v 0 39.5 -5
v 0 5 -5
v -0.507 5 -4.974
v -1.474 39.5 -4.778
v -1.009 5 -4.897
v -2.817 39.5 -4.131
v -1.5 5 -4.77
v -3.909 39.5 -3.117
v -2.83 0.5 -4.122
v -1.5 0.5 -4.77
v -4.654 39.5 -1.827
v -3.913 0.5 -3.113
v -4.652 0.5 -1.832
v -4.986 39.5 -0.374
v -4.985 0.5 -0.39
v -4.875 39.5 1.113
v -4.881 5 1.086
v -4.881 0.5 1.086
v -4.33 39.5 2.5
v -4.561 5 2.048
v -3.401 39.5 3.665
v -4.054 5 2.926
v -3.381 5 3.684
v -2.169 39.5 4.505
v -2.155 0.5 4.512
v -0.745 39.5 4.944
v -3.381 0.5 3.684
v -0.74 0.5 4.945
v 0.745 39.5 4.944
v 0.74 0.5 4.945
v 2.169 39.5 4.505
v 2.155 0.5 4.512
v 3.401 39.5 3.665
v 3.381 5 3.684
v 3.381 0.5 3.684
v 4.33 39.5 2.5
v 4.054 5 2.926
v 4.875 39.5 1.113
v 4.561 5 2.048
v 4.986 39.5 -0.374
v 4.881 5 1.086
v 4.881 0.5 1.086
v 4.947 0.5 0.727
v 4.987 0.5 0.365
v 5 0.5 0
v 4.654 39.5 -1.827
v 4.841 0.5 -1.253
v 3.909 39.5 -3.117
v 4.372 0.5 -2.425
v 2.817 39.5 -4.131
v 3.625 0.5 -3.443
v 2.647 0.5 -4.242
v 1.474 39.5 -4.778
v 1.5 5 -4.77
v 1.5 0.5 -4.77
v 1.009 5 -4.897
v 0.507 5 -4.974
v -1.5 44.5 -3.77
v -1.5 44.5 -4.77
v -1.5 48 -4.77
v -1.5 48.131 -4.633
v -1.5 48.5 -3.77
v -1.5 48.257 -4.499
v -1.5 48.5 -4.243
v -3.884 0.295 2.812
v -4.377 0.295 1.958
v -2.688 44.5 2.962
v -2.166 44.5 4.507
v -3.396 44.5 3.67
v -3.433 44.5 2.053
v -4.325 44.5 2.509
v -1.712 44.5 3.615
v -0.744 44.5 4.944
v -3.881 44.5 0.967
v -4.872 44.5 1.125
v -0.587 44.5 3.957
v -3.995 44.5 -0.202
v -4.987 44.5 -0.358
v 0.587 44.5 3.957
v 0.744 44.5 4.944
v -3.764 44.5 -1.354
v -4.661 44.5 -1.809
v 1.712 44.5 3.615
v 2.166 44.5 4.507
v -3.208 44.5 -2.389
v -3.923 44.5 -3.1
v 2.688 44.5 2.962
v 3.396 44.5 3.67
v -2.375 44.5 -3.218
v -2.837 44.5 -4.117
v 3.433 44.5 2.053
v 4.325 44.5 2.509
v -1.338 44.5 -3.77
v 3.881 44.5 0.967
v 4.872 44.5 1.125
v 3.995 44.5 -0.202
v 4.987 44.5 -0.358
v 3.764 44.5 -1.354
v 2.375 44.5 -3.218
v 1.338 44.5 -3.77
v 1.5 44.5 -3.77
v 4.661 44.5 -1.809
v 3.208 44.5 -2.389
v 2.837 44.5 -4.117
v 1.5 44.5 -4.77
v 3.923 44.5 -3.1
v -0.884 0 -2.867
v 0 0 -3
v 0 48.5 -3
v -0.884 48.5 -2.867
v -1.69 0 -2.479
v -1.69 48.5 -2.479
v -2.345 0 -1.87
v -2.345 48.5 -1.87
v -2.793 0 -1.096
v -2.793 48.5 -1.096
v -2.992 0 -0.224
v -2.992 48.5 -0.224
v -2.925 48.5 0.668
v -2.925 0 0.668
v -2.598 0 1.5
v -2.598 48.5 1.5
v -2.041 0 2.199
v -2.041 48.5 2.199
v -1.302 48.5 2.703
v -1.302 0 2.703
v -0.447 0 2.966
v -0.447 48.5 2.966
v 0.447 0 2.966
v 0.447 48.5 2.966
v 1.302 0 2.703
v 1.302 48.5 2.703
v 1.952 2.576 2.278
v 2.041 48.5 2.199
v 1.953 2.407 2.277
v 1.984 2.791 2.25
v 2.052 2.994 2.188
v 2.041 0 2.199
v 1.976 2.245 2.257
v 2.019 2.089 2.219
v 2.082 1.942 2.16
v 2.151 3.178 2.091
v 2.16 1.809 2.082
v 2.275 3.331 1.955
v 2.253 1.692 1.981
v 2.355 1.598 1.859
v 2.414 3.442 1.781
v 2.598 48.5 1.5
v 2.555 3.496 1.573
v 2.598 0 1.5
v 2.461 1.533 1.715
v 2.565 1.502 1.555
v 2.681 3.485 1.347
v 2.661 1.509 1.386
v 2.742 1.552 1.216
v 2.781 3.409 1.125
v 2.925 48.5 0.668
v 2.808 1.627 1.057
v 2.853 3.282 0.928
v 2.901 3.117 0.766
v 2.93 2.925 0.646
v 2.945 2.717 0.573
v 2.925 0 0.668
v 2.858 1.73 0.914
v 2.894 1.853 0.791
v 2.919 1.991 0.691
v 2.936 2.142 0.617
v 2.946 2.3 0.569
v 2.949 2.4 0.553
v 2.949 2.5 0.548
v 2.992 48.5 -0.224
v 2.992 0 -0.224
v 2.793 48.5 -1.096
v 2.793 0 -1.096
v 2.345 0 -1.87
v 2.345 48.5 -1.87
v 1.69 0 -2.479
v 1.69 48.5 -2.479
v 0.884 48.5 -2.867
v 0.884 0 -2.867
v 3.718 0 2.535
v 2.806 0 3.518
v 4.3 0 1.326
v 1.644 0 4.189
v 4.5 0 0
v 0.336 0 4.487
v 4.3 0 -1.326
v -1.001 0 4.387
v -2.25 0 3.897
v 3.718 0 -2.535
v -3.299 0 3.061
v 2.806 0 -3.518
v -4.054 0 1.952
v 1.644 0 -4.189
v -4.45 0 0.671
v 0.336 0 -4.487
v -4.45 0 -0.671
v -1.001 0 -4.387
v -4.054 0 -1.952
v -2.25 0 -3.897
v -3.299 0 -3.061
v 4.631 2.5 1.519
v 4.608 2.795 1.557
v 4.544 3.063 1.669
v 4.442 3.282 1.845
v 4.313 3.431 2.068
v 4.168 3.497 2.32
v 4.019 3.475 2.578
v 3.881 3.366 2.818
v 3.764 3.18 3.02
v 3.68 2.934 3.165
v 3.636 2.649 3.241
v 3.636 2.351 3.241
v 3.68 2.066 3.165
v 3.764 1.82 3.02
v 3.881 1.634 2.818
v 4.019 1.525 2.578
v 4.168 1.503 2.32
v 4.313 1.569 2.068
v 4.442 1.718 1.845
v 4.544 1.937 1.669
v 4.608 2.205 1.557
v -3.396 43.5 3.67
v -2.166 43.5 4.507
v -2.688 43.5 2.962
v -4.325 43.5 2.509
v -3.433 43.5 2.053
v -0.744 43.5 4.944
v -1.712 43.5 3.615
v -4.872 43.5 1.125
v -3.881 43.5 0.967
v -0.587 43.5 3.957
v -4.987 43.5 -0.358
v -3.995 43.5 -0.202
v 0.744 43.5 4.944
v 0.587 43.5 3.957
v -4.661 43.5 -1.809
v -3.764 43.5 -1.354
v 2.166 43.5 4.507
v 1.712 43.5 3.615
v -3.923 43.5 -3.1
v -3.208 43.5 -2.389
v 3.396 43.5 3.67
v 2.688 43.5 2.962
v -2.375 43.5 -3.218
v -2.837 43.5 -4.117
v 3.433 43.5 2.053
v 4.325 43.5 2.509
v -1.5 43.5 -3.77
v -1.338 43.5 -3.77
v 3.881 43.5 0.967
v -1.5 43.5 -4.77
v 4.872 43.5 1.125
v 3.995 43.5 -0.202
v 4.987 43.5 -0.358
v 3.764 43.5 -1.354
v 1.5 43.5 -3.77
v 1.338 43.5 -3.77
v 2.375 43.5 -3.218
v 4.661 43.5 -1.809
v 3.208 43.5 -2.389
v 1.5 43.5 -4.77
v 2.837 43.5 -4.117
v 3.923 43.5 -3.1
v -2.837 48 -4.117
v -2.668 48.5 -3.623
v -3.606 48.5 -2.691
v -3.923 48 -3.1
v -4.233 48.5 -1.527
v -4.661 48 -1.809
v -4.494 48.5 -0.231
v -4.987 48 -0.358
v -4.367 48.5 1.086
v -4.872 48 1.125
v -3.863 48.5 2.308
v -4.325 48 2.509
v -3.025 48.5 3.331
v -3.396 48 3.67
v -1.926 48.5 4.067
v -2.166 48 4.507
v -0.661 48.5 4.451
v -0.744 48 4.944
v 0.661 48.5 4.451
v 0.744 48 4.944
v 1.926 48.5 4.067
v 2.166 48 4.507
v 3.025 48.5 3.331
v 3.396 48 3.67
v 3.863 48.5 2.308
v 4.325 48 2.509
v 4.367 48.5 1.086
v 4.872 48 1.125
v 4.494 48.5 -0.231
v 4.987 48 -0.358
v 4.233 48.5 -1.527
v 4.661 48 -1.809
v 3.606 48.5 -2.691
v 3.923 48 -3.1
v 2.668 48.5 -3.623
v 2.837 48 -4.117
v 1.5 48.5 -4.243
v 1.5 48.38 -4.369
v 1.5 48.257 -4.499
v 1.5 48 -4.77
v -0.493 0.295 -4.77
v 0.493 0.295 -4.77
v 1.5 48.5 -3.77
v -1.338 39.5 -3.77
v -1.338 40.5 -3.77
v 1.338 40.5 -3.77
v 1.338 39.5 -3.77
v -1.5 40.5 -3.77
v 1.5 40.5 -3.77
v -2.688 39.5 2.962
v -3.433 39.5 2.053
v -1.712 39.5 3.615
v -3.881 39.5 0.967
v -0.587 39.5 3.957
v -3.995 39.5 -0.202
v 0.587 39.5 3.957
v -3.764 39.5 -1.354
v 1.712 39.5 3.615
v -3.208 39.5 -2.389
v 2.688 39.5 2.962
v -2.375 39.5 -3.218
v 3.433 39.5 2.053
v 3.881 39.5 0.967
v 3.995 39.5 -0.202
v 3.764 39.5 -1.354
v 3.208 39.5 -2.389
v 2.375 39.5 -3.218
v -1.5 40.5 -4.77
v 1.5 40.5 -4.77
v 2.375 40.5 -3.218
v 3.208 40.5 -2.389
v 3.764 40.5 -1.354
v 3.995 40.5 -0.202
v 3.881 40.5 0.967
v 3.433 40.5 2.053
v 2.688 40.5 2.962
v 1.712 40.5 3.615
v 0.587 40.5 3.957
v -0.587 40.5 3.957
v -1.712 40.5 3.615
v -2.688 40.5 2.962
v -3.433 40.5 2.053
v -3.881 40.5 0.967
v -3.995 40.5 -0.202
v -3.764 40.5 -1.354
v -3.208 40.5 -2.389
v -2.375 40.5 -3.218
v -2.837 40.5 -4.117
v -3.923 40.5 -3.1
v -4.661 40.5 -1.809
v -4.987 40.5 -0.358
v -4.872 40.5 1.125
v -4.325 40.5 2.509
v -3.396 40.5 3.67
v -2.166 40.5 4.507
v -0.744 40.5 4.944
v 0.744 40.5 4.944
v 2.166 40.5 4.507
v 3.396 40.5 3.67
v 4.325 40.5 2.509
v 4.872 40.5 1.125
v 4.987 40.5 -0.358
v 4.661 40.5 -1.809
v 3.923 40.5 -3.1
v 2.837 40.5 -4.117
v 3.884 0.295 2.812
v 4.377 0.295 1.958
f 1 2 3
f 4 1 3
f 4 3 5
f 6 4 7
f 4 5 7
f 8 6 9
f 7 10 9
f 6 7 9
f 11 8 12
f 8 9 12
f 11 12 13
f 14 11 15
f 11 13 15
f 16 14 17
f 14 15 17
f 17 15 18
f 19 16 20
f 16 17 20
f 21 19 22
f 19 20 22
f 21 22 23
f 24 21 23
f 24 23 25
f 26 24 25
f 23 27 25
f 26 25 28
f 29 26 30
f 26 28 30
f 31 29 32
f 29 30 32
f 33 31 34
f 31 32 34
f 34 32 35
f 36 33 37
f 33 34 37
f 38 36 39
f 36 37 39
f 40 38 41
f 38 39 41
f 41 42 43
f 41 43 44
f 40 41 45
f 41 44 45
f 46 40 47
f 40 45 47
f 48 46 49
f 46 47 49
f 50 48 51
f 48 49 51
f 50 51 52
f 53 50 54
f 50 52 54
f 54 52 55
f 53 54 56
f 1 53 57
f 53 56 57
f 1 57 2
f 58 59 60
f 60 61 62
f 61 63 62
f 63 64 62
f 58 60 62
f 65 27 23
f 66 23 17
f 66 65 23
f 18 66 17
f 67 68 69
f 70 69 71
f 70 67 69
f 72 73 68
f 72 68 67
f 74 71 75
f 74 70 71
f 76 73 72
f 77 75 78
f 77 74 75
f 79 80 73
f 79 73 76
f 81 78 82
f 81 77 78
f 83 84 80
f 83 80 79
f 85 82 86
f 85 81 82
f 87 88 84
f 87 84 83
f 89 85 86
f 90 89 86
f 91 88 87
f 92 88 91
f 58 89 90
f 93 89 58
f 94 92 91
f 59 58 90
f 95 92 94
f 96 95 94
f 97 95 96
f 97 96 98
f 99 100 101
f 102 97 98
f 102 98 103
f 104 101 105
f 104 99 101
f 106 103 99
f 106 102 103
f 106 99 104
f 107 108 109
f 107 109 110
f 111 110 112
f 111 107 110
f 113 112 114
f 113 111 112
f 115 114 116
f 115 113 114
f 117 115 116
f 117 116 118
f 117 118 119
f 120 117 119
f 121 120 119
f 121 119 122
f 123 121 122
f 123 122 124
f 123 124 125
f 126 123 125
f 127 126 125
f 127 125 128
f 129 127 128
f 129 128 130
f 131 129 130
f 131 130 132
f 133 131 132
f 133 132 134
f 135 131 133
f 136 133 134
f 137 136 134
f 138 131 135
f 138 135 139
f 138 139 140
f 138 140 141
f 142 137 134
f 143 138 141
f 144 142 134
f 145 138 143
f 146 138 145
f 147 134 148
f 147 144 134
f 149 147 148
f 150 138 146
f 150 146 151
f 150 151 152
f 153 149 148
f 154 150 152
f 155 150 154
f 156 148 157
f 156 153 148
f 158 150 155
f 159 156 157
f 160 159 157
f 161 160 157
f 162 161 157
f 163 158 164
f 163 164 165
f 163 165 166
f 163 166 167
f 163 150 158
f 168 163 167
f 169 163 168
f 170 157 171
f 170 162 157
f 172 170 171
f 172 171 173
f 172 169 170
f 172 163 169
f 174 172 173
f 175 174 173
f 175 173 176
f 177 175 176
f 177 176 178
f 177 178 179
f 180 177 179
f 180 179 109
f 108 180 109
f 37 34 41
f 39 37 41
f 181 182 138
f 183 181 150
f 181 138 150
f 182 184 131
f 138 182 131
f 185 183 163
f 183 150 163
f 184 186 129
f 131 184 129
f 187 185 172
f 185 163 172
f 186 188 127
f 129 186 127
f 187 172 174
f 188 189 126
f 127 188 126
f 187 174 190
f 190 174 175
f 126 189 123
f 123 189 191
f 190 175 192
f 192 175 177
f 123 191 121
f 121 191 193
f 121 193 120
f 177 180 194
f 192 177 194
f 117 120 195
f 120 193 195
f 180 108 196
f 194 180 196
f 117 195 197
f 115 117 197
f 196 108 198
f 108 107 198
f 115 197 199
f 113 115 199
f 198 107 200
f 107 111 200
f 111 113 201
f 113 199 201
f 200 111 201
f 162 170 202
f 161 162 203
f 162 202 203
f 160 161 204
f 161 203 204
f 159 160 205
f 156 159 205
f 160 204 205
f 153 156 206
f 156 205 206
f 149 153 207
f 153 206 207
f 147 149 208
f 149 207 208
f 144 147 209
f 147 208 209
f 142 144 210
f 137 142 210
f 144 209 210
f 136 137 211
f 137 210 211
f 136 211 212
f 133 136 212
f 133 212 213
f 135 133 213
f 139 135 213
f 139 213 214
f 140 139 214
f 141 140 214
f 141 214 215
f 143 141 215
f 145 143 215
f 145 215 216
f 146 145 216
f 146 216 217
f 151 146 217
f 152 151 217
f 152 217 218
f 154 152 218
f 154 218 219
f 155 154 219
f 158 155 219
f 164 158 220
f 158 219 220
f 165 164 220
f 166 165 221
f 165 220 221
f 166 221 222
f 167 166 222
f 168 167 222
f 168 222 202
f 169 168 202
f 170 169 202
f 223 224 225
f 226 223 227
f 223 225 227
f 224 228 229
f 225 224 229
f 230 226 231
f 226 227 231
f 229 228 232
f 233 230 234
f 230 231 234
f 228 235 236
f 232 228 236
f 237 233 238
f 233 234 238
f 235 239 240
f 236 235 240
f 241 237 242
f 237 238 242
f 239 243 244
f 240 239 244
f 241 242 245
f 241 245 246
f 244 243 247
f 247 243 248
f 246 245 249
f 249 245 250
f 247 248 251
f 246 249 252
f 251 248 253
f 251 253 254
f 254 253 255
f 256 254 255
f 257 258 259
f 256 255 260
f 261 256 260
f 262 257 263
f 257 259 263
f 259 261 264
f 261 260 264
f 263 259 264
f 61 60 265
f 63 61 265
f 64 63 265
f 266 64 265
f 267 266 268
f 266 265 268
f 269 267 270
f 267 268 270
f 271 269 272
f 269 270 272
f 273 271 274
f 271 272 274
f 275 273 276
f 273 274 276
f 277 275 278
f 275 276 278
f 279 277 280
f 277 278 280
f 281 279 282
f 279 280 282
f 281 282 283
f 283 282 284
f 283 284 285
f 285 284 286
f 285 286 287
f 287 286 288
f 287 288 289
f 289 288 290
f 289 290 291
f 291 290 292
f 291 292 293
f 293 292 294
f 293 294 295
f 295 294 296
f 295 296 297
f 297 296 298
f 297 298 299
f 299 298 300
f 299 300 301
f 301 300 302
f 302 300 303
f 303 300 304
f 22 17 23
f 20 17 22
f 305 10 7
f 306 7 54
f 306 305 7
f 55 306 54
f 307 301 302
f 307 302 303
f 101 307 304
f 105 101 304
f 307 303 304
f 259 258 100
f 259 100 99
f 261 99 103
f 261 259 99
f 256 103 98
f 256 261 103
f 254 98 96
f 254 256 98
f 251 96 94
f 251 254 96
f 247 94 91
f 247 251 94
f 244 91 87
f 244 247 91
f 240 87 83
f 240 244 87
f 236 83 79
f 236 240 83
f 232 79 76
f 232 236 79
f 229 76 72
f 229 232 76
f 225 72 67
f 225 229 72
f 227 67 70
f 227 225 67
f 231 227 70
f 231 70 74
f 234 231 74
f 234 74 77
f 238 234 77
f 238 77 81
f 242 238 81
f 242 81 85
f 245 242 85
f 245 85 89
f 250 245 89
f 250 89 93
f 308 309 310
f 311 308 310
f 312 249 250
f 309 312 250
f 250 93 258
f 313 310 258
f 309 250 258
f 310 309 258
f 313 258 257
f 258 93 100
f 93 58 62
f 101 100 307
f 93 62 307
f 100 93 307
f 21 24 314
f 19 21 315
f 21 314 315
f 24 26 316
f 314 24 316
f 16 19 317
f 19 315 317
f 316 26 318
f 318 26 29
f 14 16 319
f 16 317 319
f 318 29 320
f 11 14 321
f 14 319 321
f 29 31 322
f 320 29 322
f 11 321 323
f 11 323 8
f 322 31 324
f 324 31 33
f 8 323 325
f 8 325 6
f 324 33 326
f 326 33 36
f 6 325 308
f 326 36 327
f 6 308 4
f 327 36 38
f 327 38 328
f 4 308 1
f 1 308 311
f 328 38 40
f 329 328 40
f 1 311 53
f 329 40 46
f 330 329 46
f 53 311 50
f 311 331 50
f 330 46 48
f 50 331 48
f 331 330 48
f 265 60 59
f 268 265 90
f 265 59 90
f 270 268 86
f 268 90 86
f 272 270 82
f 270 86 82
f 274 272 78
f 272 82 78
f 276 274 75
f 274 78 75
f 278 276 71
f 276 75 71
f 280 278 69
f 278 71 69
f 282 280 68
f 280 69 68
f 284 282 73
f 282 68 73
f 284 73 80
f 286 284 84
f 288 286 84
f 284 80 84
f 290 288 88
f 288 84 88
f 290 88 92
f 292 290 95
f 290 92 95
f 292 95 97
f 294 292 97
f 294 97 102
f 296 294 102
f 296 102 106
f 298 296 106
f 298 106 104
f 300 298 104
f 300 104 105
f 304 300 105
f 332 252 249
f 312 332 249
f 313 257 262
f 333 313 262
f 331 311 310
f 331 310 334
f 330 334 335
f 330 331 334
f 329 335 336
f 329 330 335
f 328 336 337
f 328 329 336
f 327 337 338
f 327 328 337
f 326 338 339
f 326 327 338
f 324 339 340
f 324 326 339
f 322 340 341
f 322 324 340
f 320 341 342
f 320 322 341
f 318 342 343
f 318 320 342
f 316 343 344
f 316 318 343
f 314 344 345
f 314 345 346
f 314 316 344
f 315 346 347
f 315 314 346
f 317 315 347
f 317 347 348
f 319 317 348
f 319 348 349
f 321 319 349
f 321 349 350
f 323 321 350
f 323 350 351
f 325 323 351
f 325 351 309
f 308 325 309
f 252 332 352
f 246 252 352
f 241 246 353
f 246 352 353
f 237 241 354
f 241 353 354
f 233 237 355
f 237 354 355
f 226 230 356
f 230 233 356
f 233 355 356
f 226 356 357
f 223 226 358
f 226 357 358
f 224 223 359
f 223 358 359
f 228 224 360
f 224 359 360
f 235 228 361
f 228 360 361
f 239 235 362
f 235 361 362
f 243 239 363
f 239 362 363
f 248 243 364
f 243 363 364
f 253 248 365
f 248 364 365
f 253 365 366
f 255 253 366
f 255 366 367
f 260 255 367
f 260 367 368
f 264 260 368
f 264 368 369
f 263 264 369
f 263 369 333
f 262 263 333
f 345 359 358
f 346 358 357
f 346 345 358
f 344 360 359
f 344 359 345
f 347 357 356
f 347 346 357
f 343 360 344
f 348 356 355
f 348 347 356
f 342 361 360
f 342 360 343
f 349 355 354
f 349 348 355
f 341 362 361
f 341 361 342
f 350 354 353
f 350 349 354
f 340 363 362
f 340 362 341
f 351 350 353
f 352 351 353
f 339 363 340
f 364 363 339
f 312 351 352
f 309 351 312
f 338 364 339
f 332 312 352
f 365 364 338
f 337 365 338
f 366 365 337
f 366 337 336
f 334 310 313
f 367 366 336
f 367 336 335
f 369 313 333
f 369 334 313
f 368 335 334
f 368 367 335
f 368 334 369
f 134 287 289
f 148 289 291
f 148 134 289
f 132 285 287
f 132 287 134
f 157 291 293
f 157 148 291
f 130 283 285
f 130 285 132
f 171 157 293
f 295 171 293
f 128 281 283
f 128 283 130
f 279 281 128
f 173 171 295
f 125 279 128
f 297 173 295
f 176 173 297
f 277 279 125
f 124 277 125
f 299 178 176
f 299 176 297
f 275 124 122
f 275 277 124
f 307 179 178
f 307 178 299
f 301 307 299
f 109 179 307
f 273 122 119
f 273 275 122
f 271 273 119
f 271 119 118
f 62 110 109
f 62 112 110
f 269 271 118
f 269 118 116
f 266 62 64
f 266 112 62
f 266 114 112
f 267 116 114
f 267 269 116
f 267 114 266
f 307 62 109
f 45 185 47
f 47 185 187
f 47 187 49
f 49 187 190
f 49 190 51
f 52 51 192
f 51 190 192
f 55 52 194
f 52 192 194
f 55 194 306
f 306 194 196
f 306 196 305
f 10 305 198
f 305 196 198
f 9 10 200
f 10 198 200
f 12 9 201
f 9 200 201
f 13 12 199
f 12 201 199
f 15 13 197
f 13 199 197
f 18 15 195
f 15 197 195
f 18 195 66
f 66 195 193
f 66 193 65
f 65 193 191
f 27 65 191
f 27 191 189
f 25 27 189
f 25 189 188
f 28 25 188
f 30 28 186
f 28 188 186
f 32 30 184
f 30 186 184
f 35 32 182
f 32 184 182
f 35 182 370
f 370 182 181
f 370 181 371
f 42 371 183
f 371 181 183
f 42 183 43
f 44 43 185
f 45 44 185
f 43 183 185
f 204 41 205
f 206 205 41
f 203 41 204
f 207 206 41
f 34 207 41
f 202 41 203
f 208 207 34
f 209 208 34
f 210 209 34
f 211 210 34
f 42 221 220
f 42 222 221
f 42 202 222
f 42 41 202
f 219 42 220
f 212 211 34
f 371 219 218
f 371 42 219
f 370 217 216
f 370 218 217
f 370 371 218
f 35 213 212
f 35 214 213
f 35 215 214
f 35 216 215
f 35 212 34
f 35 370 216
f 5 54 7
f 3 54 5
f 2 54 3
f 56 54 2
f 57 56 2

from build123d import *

# Parameters (mm, degrees)
ESQUISSE1_R                  = 5
ESQUISSE1_R_2                = 3
BOSS_EXTRU_1_DEPTH           = 48.5
ENL_V_MAT_EXTRU_1_DEPTH      = 5
ENL_V_MAT_EXTRU_2_REACH      = 51.901
ENL_V_MAT_EXTRU_2_END_RADIUS = 3
ESQUISSE3_R                  = 1
ESQUISSE4_R                  = 5
ESQUISSE4_R_2                = 4
ENL_V_MAT_EXTRU_3_DEPTH      = 1
ESQUISSE6_R                  = 5
ESQUISSE6_R_2                = 4
ENL_V_MAT_EXTRU_5_DEPTH      = 1
ENL_V_MAT_EXTRU_4_REACH      = 51.013


with BuildPart() as part:
    # Esquisse1 → Boss.-Extru.1 (new body)
    with BuildSketch(Plane(origin=(0, 0, 0), x_dir=(1, 0, 0), z_dir=(0, 1, 0))):
        with Locations(Location((0, 0, 0), (0, 0, 90))):
            Circle(ESQUISSE1_R)
        with Locations(Location((0, 0, 0), (0, 0, 90))):
            Circle(ESQUISSE1_R_2, mode=Mode.SUBTRACT)
    extrude(amount=BOSS_EXTRU_1_DEPTH)

    # Esquisse2 → Enlèv. mat.-Extru.1 (cut)
    with BuildSketch(Plane.XZ):
        with BuildLine():
            Line((-1.5, -4.769696007), (1.5, -4.769696007))
            ThreePointArc((1.5, -4.769696007), (0, -5), (-1.5, -4.769696007))
        make_face()
        with BuildLine():
            Line((-3.38067791, 3.683886109), (-4.88067791, 1.085809898))
            ThreePointArc((-4.88067791, 1.085809898), (-4.330127019, 2.5), (-3.38067791, 3.683886109))
        make_face()
        with BuildLine():
            Line((4.88067791, 1.085809898), (3.38067791, 3.683886109))
            ThreePointArc((3.38067791, 3.683886109), (4.330127019, 2.5), (4.88067791, 1.085809898))
        make_face()
    extrude(amount=-ENL_V_MAT_EXTRU_1_DEPTH, mode=Mode.SUBTRACT)

    # Enlèv. mat.-Extru.2: up to this cylinder (the profile starts outside it)
    enl_v_mat_extru_2_end = Plane(origin=(0, 2.5, 0), z_dir=(0, -1, 0)) * Cylinder(ENL_V_MAT_EXTRU_2_END_RADIUS, 110.802, mode=Mode.PRIVATE)
    # Esquisse3 → Enlèv. mat.-Extru.2 (cut, up to the surface)
    with BuildSketch(Plane(origin=(4.13067791, 0, 2.384848004), x_dir=(0.49999999999999223, 0, -0.8660254037844431), z_dir=(0.8660254037844431, 0, 0.49999999999999223)), mode=Mode.PRIVATE) as enl_v_mat_extru_2_sk1:
        with Locations((0, 2.5)):
            Circle(ESQUISSE3_R)
    enl_v_mat_extru_2_tool1 = extrude(enl_v_mat_extru_2_sk1.sketch, amount=-ENL_V_MAT_EXTRU_2_REACH, mode=Mode.PRIVATE) - enl_v_mat_extru_2_end
    add(enl_v_mat_extru_2_tool1.solids().sort_by_distance((4.130678, 2.5, 2.384848))[0], mode=Mode.SUBTRACT)

    # Esquisse4 → Enlèv. mat.-Extru.3 (cut)
    with BuildSketch(Plane(origin=(0, 39.5, 0), x_dir=(-1, 0, 0), z_dir=(0, -1, 0))):
        with Locations(Location((0, 0, 0), (0, 0, 90))):
            Circle(ESQUISSE4_R)
        with Locations(Location((0, 0, 0), (0, 0, 90))):
            Circle(ESQUISSE4_R_2, mode=Mode.SUBTRACT)
    extrude(amount=-ENL_V_MAT_EXTRU_3_DEPTH, mode=Mode.SUBTRACT)

    # Esquisse6 → Enlèv. mat.-Extru.5 (cut)
    with BuildSketch(Plane(origin=(0, 43.5, 0), x_dir=(-1, 0, 0), z_dir=(0, -1, 0))):
        with Locations(Location((0, 0, 0), (0, 0, 90))):
            Circle(ESQUISSE6_R)
        with Locations(Location((0, 0, 0), (0, 0, 90))):
            Circle(ESQUISSE6_R_2, mode=Mode.SUBTRACT)
    extrude(amount=-ENL_V_MAT_EXTRU_5_DEPTH, mode=Mode.SUBTRACT)

    # Enlèv. mat.-Extru.4: up to this face of the body (flat: up to its plane)
    enl_v_mat_extru_4_end = Plane(part.part.faces().sort_by_distance((0, 39.5, 4.858578644))[0])
    # Esquisse5 → Enlèv. mat.-Extru.4 (cut, up to the picked face)
    with BuildSketch(Plane(origin=(0, 48.5, 0), x_dir=(1, 0, 0), z_dir=(0, 1, 0)), mode=Mode.PRIVATE) as enl_v_mat_extru_4_sk1:
        with BuildLine():
            Line((-1.5, 3.769696007), (1.5, 3.769696007))
            Line((1.5, 3.769696007), (1.5, 4.769696007))
            ThreePointArc((1.5, 4.769696007), (0, 5), (-1.5, 4.769696007))
            Line((-1.5, 4.769696007), (-1.5, 3.769696007))
        make_face()
    enl_v_mat_extru_4_tool1 = split(extrude(enl_v_mat_extru_4_sk1.sketch, amount=-ENL_V_MAT_EXTRU_4_REACH, mode=Mode.PRIVATE), bisect_by=enl_v_mat_extru_4_end, keep=Keep.BOTH, mode=Mode.PRIVATE)
    add(enl_v_mat_extru_4_tool1.solids().sort_by(Axis((0, 48.5, -4.348853), (0, -1, 0)))[0], mode=Mode.SUBTRACT)

    # Chanfrein1: read off the stored shape, not the designer's step
    # Chanfrein1 outline → Chanfrein1 (revolve, cut)
    with BuildSketch(Plane.XY):
        Polygon((5, 0.5), (4.5, 0), (5, 0), align=None)
        Polygon((4.5, 48.5), (5, 48), (5, 48.5), align=None)
    revolve(axis=Axis((0, 0, 0), (0, 1, 0)), mode=Mode.SUBTRACT)


solid = part.part
